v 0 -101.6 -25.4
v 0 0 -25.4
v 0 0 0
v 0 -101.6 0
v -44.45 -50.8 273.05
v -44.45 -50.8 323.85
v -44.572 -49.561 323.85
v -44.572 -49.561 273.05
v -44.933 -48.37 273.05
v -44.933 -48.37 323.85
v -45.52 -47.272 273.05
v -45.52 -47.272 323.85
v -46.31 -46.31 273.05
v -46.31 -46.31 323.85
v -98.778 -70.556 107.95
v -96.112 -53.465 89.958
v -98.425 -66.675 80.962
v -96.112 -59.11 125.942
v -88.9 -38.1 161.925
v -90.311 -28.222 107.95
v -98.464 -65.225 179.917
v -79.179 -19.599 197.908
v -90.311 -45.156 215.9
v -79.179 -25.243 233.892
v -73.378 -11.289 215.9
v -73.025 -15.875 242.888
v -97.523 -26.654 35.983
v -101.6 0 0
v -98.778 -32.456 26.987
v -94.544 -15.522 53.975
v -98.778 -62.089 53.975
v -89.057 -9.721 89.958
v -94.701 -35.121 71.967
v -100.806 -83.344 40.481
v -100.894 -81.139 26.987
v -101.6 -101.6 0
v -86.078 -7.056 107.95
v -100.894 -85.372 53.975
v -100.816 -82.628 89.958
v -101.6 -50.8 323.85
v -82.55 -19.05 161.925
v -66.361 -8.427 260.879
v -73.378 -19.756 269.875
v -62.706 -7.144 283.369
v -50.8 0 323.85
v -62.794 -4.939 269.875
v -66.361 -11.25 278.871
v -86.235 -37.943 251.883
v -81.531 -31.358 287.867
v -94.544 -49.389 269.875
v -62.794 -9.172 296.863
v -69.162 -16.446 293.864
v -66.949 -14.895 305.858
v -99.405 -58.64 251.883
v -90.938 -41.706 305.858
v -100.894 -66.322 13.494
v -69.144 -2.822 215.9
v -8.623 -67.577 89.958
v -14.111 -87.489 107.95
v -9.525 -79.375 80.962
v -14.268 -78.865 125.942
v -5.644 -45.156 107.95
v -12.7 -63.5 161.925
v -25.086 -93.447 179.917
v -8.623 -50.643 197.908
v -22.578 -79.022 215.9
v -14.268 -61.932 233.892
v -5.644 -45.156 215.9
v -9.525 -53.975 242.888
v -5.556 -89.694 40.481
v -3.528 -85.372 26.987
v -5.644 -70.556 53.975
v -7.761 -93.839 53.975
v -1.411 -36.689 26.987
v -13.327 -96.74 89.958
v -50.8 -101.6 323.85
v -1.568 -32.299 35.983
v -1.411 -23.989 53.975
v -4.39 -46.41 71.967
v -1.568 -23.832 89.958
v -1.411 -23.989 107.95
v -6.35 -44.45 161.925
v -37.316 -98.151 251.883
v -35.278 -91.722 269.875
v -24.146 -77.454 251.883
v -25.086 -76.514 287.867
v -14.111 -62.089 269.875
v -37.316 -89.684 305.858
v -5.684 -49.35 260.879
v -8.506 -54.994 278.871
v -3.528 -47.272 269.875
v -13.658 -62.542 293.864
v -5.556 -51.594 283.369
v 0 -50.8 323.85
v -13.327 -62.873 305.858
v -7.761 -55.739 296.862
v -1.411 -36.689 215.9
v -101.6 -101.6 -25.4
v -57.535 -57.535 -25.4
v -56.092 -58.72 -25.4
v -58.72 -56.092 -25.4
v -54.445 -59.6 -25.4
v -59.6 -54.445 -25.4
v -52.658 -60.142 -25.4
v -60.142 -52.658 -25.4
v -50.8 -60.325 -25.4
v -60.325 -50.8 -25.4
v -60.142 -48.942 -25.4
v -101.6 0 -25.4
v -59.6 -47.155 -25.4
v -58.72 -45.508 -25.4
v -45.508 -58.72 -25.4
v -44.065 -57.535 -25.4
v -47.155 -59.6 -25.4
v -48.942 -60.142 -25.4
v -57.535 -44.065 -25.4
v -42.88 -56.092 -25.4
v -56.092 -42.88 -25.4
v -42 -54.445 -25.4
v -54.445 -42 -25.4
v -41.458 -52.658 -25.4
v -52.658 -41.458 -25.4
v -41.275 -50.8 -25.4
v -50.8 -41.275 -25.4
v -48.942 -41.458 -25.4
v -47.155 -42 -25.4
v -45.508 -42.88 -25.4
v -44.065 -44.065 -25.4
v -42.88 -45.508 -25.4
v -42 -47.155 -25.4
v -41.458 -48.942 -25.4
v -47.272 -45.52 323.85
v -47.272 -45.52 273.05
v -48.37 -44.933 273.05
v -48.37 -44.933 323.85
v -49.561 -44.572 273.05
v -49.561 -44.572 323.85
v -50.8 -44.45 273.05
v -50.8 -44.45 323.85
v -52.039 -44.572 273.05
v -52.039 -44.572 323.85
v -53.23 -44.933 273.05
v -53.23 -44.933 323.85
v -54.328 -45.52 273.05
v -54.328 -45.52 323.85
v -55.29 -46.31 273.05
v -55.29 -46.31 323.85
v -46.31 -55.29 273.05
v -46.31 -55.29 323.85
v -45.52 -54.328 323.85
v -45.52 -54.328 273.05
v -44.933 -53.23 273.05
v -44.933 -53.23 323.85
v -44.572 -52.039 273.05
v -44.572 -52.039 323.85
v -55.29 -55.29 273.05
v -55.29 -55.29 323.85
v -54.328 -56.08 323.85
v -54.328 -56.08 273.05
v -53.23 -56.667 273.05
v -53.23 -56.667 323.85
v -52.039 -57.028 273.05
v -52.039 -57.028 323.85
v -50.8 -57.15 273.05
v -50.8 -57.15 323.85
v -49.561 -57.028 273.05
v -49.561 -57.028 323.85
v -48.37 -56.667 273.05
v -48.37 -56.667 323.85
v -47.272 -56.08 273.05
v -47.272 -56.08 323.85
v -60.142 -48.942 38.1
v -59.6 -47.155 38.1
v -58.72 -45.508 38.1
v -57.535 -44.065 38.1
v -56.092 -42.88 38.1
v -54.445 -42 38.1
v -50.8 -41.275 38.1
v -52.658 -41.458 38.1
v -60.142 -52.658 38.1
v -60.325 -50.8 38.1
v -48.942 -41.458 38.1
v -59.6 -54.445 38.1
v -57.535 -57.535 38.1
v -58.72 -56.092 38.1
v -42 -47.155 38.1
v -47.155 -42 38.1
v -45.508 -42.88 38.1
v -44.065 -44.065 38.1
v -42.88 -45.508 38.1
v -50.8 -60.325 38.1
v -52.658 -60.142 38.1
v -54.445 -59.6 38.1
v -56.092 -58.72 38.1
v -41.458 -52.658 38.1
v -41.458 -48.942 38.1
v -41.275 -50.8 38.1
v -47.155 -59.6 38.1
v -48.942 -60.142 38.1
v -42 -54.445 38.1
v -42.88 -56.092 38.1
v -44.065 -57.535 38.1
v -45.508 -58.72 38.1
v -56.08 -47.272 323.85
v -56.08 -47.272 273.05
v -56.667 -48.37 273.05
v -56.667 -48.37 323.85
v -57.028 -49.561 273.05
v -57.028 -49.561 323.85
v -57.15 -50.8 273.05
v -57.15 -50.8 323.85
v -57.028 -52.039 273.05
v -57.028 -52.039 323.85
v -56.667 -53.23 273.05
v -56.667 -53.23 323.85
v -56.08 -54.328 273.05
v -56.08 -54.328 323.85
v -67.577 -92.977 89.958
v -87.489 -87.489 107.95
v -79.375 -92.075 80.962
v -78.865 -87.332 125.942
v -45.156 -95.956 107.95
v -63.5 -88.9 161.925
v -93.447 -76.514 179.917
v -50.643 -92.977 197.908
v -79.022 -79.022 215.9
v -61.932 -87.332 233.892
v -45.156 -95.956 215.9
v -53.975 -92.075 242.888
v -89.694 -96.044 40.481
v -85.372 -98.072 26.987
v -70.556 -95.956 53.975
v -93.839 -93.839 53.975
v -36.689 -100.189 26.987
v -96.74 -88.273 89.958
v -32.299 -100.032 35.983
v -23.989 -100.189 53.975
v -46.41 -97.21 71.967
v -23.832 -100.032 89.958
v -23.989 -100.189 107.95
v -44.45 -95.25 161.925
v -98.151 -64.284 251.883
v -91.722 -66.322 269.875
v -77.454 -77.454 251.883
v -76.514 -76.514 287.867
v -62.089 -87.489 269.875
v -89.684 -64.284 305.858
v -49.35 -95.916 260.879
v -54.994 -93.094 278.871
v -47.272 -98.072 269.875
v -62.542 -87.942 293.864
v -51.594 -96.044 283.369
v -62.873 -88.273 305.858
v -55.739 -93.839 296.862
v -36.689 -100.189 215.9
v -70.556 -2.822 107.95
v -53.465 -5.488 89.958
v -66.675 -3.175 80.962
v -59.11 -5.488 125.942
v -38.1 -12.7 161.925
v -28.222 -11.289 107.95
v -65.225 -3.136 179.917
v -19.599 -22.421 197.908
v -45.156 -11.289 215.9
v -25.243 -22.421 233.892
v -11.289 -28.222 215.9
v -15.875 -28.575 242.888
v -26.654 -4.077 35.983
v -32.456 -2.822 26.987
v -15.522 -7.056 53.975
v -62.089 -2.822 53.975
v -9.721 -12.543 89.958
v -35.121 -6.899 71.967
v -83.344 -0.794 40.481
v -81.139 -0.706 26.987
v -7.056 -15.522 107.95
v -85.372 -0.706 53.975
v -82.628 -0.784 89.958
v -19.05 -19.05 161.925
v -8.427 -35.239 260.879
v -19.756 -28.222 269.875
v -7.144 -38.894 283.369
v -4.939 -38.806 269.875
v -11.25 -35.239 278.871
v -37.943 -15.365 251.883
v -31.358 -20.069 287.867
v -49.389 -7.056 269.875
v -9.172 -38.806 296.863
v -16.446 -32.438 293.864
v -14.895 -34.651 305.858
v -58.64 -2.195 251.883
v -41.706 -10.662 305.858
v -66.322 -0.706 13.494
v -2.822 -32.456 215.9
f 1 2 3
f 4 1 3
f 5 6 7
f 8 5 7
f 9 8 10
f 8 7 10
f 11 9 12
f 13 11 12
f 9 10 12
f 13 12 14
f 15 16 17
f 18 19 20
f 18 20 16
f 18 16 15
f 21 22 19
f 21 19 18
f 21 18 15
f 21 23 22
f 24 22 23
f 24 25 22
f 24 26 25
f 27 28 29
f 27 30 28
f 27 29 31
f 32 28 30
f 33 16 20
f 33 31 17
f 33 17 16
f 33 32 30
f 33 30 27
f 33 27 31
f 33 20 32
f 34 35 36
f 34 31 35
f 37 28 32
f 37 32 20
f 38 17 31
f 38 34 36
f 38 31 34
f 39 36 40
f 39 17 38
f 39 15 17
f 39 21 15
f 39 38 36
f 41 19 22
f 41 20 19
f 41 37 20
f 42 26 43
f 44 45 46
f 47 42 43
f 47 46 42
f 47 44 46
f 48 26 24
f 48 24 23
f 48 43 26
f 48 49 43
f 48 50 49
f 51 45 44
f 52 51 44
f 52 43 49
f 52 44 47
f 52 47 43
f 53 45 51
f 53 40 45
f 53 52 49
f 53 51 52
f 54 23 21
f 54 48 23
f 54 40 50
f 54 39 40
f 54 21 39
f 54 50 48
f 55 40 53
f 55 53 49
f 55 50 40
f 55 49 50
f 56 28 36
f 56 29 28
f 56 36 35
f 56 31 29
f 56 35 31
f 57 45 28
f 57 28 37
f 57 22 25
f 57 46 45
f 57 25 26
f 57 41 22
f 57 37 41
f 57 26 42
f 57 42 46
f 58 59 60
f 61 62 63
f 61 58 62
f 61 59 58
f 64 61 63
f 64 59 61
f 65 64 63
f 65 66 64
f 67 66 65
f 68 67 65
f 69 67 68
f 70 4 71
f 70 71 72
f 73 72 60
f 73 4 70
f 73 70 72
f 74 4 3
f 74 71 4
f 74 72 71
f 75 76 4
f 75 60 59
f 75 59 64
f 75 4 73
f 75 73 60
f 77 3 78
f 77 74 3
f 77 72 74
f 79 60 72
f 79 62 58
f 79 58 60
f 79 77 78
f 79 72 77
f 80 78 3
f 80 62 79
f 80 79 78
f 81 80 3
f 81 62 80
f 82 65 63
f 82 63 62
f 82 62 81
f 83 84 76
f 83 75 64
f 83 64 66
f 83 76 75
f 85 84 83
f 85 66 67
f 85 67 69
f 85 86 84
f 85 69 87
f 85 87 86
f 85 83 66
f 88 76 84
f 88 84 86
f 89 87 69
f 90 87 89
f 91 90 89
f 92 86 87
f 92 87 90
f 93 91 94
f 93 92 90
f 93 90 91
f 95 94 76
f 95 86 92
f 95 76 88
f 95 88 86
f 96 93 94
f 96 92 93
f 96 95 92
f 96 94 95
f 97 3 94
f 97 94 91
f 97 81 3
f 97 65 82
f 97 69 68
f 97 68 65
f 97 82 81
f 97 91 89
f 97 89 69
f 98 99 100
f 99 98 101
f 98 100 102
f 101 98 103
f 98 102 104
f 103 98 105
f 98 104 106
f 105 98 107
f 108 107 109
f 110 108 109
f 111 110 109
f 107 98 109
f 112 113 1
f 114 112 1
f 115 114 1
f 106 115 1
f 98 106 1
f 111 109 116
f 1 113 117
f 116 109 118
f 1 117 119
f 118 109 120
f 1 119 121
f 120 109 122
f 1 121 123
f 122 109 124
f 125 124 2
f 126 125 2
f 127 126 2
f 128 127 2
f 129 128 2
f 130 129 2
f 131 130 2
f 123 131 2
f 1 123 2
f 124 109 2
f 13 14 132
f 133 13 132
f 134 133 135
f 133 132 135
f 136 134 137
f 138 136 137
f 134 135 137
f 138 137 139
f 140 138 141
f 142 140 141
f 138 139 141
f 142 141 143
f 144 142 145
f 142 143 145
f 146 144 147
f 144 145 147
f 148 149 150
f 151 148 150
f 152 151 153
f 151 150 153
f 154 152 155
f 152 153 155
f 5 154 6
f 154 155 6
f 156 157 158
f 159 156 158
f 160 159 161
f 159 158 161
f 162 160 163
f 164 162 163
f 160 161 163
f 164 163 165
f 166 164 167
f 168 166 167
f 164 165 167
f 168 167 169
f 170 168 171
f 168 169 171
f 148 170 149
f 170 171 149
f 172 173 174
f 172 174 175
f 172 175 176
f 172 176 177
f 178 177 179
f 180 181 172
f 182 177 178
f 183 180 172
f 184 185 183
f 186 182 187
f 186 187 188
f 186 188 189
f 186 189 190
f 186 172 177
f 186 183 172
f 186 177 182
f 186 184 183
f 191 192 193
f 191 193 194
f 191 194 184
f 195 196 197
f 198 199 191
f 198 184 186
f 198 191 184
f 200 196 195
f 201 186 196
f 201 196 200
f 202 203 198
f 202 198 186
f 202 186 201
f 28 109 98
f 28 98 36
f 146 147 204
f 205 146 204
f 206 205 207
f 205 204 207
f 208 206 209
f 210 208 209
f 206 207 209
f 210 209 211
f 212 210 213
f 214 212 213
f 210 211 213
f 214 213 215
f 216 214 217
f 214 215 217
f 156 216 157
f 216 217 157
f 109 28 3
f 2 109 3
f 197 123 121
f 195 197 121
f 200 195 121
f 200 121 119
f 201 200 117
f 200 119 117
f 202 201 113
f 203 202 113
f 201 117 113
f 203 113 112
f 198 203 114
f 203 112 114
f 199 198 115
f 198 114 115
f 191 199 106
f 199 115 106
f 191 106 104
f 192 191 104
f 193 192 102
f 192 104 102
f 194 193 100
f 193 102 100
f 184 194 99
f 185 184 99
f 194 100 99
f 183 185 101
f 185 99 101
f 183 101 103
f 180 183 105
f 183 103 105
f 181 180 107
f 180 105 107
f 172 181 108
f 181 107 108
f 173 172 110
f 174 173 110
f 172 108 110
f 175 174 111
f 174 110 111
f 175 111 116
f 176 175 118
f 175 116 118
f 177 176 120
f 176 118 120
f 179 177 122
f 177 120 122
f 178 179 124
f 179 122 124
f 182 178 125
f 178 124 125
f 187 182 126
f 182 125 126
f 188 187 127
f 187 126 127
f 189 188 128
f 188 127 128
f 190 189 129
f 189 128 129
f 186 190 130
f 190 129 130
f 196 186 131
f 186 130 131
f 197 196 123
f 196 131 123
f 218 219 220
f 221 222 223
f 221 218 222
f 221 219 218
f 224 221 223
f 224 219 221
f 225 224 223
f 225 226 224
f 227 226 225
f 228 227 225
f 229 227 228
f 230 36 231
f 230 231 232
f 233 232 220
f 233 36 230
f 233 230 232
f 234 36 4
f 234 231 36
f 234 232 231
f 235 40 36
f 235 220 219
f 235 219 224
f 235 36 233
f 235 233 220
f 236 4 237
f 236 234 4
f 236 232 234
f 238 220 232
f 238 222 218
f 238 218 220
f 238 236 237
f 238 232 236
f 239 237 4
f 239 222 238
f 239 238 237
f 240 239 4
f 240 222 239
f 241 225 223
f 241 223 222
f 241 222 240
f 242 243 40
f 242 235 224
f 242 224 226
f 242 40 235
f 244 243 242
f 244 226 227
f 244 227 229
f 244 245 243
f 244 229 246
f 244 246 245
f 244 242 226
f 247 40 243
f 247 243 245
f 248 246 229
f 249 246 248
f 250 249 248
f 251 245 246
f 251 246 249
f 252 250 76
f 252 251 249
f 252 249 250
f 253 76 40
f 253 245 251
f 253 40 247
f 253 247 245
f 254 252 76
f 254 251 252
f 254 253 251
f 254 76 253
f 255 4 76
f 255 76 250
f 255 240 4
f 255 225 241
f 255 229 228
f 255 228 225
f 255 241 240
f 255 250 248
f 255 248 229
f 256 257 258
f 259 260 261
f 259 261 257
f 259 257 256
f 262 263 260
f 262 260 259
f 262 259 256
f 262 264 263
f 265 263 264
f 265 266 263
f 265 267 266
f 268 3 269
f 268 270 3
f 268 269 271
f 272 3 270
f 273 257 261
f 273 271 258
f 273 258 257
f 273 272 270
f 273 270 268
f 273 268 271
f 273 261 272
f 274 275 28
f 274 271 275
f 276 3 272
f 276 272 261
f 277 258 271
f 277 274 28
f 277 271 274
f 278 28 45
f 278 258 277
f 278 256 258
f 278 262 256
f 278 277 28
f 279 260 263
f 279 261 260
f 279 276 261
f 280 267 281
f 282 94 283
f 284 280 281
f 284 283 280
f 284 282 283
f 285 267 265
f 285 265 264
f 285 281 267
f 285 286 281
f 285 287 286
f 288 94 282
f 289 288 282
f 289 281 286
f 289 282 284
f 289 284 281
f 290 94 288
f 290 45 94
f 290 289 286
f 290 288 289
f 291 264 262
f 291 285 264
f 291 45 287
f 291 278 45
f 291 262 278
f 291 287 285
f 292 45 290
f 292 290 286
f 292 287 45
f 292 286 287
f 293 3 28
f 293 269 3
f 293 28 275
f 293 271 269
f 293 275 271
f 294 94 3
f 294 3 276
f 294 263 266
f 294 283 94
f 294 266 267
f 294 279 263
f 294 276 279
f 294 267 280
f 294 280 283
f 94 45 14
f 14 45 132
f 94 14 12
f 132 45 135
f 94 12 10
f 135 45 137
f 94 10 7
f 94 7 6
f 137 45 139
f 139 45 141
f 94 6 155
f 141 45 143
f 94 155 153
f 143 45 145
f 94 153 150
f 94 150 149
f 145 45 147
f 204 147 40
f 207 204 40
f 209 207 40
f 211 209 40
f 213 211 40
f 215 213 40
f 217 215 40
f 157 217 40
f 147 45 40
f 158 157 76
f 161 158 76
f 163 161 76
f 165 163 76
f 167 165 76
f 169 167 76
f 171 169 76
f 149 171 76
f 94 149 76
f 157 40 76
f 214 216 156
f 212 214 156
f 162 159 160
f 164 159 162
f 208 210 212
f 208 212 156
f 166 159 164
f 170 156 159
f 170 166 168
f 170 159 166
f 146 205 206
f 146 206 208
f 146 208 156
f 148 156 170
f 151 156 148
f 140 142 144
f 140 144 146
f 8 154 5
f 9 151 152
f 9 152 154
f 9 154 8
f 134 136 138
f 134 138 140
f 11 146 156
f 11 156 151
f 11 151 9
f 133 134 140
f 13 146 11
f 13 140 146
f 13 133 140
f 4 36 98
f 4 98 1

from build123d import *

# Parameters (mm, degrees)
F0_W      = 101.6
F0_H      = 25.4
F1_DEPTH  = 101.6
F1_FACE_W = 101.6
F1_FACE_H = 101.6
F6_DEPTH  = 50.8
F8_DEPTH  = 63.5


with BuildPart() as f1:
    # F0 (on Front) → F1 (new body)
    with BuildSketch(Plane.XZ):
        with Locations((-50.8, -12.7)):
            Rectangle(F0_W, F0_H)
    extrude(amount=F1_DEPTH)

    # F1_face (on face) → F4 section 0
    with BuildSketch(Plane(origin=(-50.8, -50.8, 0), x_dir=(1, 0, 0), z_dir=(0, 0, 1))):
        Rectangle(F1_FACE_W, F1_FACE_H)
    # F3 (on offset) → F4 section 1
    with BuildSketch(Plane.XY.offset(323.85)):
        Polygon((0, -50.8), (-50.8, 0), (-101.6, -50.8), (-50.8, -101.6), align=None)
    loft()

    # F5 (on face) → F6 (cut)
    with BuildSketch(Plane.XY.offset(323.85)):
        with BuildLine():
            ThreePointArc((-46.3098719395, -46.3098719395), (-50.8, -44.45), (-55.2901280605, -46.3098719395))
            Line((-55.2901280605, -46.3098719395), (-50.8, -50.8))
            Line((-50.8, -50.8), (-46.3098719395, -46.3098719395))
        make_face()
        with BuildLine():
            Line((-50.8, -50.8), (-55.2901280605, -46.3098719395))
            ThreePointArc((-55.2901280605, -46.3098719395), (-57.15, -50.8), (-55.2901280605, -55.2901280605))
            Line((-55.2901280605, -55.2901280605), (-50.8, -50.8))
        make_face()
        with BuildLine():
            Line((-46.3098719395, -55.2901280605), (-50.8, -50.8))
            Line((-50.8, -50.8), (-55.2901280605, -55.2901280605))
            ThreePointArc((-55.2901280605, -55.2901280605), (-50.8, -57.15), (-46.3098719395, -55.2901280605))
        make_face()
        with BuildLine():
            Line((-46.3098719395, -46.3098719395), (-50.8, -50.8))
            Line((-50.8, -50.8), (-46.3098719395, -55.2901280605))
            ThreePointArc((-46.3098719395, -55.2901280605), (-44.9333649686, -53.2300397955), (-44.45, -50.8))
            ThreePointArc((-44.45, -50.8), (-44.9333649686, -48.3699602045), (-46.3098719395, -46.3098719395))
        make_face()
    extrude(amount=-F6_DEPTH, mode=Mode.SUBTRACT)

    # F7 (on face) → F8 (cut)
    with BuildSketch(Plane(origin=(0, 0, -25.4), x_dir=(1, 0, 0), z_dir=(0, 0, -1))):
        with BuildLine():
            ThreePointArc((-41.275, 50.8), (-44.0648079092, 57.5351920908), (-50.8, 60.325))
            Line((-50.8, 60.325), (-50.8, 41.275))
            ThreePointArc((-50.8, 41.275), (-44.0648079092, 44.0648079092), (-41.275, 50.8))
        make_face()
        with BuildLine():
            Line((-50.8, 41.275), (-50.8, 60.325))
            ThreePointArc((-50.8, 60.325), (-60.325, 50.8), (-50.8, 41.275))
        make_face()
    extrude(amount=-F8_DEPTH, mode=Mode.SUBTRACT)


solid = f1.part
